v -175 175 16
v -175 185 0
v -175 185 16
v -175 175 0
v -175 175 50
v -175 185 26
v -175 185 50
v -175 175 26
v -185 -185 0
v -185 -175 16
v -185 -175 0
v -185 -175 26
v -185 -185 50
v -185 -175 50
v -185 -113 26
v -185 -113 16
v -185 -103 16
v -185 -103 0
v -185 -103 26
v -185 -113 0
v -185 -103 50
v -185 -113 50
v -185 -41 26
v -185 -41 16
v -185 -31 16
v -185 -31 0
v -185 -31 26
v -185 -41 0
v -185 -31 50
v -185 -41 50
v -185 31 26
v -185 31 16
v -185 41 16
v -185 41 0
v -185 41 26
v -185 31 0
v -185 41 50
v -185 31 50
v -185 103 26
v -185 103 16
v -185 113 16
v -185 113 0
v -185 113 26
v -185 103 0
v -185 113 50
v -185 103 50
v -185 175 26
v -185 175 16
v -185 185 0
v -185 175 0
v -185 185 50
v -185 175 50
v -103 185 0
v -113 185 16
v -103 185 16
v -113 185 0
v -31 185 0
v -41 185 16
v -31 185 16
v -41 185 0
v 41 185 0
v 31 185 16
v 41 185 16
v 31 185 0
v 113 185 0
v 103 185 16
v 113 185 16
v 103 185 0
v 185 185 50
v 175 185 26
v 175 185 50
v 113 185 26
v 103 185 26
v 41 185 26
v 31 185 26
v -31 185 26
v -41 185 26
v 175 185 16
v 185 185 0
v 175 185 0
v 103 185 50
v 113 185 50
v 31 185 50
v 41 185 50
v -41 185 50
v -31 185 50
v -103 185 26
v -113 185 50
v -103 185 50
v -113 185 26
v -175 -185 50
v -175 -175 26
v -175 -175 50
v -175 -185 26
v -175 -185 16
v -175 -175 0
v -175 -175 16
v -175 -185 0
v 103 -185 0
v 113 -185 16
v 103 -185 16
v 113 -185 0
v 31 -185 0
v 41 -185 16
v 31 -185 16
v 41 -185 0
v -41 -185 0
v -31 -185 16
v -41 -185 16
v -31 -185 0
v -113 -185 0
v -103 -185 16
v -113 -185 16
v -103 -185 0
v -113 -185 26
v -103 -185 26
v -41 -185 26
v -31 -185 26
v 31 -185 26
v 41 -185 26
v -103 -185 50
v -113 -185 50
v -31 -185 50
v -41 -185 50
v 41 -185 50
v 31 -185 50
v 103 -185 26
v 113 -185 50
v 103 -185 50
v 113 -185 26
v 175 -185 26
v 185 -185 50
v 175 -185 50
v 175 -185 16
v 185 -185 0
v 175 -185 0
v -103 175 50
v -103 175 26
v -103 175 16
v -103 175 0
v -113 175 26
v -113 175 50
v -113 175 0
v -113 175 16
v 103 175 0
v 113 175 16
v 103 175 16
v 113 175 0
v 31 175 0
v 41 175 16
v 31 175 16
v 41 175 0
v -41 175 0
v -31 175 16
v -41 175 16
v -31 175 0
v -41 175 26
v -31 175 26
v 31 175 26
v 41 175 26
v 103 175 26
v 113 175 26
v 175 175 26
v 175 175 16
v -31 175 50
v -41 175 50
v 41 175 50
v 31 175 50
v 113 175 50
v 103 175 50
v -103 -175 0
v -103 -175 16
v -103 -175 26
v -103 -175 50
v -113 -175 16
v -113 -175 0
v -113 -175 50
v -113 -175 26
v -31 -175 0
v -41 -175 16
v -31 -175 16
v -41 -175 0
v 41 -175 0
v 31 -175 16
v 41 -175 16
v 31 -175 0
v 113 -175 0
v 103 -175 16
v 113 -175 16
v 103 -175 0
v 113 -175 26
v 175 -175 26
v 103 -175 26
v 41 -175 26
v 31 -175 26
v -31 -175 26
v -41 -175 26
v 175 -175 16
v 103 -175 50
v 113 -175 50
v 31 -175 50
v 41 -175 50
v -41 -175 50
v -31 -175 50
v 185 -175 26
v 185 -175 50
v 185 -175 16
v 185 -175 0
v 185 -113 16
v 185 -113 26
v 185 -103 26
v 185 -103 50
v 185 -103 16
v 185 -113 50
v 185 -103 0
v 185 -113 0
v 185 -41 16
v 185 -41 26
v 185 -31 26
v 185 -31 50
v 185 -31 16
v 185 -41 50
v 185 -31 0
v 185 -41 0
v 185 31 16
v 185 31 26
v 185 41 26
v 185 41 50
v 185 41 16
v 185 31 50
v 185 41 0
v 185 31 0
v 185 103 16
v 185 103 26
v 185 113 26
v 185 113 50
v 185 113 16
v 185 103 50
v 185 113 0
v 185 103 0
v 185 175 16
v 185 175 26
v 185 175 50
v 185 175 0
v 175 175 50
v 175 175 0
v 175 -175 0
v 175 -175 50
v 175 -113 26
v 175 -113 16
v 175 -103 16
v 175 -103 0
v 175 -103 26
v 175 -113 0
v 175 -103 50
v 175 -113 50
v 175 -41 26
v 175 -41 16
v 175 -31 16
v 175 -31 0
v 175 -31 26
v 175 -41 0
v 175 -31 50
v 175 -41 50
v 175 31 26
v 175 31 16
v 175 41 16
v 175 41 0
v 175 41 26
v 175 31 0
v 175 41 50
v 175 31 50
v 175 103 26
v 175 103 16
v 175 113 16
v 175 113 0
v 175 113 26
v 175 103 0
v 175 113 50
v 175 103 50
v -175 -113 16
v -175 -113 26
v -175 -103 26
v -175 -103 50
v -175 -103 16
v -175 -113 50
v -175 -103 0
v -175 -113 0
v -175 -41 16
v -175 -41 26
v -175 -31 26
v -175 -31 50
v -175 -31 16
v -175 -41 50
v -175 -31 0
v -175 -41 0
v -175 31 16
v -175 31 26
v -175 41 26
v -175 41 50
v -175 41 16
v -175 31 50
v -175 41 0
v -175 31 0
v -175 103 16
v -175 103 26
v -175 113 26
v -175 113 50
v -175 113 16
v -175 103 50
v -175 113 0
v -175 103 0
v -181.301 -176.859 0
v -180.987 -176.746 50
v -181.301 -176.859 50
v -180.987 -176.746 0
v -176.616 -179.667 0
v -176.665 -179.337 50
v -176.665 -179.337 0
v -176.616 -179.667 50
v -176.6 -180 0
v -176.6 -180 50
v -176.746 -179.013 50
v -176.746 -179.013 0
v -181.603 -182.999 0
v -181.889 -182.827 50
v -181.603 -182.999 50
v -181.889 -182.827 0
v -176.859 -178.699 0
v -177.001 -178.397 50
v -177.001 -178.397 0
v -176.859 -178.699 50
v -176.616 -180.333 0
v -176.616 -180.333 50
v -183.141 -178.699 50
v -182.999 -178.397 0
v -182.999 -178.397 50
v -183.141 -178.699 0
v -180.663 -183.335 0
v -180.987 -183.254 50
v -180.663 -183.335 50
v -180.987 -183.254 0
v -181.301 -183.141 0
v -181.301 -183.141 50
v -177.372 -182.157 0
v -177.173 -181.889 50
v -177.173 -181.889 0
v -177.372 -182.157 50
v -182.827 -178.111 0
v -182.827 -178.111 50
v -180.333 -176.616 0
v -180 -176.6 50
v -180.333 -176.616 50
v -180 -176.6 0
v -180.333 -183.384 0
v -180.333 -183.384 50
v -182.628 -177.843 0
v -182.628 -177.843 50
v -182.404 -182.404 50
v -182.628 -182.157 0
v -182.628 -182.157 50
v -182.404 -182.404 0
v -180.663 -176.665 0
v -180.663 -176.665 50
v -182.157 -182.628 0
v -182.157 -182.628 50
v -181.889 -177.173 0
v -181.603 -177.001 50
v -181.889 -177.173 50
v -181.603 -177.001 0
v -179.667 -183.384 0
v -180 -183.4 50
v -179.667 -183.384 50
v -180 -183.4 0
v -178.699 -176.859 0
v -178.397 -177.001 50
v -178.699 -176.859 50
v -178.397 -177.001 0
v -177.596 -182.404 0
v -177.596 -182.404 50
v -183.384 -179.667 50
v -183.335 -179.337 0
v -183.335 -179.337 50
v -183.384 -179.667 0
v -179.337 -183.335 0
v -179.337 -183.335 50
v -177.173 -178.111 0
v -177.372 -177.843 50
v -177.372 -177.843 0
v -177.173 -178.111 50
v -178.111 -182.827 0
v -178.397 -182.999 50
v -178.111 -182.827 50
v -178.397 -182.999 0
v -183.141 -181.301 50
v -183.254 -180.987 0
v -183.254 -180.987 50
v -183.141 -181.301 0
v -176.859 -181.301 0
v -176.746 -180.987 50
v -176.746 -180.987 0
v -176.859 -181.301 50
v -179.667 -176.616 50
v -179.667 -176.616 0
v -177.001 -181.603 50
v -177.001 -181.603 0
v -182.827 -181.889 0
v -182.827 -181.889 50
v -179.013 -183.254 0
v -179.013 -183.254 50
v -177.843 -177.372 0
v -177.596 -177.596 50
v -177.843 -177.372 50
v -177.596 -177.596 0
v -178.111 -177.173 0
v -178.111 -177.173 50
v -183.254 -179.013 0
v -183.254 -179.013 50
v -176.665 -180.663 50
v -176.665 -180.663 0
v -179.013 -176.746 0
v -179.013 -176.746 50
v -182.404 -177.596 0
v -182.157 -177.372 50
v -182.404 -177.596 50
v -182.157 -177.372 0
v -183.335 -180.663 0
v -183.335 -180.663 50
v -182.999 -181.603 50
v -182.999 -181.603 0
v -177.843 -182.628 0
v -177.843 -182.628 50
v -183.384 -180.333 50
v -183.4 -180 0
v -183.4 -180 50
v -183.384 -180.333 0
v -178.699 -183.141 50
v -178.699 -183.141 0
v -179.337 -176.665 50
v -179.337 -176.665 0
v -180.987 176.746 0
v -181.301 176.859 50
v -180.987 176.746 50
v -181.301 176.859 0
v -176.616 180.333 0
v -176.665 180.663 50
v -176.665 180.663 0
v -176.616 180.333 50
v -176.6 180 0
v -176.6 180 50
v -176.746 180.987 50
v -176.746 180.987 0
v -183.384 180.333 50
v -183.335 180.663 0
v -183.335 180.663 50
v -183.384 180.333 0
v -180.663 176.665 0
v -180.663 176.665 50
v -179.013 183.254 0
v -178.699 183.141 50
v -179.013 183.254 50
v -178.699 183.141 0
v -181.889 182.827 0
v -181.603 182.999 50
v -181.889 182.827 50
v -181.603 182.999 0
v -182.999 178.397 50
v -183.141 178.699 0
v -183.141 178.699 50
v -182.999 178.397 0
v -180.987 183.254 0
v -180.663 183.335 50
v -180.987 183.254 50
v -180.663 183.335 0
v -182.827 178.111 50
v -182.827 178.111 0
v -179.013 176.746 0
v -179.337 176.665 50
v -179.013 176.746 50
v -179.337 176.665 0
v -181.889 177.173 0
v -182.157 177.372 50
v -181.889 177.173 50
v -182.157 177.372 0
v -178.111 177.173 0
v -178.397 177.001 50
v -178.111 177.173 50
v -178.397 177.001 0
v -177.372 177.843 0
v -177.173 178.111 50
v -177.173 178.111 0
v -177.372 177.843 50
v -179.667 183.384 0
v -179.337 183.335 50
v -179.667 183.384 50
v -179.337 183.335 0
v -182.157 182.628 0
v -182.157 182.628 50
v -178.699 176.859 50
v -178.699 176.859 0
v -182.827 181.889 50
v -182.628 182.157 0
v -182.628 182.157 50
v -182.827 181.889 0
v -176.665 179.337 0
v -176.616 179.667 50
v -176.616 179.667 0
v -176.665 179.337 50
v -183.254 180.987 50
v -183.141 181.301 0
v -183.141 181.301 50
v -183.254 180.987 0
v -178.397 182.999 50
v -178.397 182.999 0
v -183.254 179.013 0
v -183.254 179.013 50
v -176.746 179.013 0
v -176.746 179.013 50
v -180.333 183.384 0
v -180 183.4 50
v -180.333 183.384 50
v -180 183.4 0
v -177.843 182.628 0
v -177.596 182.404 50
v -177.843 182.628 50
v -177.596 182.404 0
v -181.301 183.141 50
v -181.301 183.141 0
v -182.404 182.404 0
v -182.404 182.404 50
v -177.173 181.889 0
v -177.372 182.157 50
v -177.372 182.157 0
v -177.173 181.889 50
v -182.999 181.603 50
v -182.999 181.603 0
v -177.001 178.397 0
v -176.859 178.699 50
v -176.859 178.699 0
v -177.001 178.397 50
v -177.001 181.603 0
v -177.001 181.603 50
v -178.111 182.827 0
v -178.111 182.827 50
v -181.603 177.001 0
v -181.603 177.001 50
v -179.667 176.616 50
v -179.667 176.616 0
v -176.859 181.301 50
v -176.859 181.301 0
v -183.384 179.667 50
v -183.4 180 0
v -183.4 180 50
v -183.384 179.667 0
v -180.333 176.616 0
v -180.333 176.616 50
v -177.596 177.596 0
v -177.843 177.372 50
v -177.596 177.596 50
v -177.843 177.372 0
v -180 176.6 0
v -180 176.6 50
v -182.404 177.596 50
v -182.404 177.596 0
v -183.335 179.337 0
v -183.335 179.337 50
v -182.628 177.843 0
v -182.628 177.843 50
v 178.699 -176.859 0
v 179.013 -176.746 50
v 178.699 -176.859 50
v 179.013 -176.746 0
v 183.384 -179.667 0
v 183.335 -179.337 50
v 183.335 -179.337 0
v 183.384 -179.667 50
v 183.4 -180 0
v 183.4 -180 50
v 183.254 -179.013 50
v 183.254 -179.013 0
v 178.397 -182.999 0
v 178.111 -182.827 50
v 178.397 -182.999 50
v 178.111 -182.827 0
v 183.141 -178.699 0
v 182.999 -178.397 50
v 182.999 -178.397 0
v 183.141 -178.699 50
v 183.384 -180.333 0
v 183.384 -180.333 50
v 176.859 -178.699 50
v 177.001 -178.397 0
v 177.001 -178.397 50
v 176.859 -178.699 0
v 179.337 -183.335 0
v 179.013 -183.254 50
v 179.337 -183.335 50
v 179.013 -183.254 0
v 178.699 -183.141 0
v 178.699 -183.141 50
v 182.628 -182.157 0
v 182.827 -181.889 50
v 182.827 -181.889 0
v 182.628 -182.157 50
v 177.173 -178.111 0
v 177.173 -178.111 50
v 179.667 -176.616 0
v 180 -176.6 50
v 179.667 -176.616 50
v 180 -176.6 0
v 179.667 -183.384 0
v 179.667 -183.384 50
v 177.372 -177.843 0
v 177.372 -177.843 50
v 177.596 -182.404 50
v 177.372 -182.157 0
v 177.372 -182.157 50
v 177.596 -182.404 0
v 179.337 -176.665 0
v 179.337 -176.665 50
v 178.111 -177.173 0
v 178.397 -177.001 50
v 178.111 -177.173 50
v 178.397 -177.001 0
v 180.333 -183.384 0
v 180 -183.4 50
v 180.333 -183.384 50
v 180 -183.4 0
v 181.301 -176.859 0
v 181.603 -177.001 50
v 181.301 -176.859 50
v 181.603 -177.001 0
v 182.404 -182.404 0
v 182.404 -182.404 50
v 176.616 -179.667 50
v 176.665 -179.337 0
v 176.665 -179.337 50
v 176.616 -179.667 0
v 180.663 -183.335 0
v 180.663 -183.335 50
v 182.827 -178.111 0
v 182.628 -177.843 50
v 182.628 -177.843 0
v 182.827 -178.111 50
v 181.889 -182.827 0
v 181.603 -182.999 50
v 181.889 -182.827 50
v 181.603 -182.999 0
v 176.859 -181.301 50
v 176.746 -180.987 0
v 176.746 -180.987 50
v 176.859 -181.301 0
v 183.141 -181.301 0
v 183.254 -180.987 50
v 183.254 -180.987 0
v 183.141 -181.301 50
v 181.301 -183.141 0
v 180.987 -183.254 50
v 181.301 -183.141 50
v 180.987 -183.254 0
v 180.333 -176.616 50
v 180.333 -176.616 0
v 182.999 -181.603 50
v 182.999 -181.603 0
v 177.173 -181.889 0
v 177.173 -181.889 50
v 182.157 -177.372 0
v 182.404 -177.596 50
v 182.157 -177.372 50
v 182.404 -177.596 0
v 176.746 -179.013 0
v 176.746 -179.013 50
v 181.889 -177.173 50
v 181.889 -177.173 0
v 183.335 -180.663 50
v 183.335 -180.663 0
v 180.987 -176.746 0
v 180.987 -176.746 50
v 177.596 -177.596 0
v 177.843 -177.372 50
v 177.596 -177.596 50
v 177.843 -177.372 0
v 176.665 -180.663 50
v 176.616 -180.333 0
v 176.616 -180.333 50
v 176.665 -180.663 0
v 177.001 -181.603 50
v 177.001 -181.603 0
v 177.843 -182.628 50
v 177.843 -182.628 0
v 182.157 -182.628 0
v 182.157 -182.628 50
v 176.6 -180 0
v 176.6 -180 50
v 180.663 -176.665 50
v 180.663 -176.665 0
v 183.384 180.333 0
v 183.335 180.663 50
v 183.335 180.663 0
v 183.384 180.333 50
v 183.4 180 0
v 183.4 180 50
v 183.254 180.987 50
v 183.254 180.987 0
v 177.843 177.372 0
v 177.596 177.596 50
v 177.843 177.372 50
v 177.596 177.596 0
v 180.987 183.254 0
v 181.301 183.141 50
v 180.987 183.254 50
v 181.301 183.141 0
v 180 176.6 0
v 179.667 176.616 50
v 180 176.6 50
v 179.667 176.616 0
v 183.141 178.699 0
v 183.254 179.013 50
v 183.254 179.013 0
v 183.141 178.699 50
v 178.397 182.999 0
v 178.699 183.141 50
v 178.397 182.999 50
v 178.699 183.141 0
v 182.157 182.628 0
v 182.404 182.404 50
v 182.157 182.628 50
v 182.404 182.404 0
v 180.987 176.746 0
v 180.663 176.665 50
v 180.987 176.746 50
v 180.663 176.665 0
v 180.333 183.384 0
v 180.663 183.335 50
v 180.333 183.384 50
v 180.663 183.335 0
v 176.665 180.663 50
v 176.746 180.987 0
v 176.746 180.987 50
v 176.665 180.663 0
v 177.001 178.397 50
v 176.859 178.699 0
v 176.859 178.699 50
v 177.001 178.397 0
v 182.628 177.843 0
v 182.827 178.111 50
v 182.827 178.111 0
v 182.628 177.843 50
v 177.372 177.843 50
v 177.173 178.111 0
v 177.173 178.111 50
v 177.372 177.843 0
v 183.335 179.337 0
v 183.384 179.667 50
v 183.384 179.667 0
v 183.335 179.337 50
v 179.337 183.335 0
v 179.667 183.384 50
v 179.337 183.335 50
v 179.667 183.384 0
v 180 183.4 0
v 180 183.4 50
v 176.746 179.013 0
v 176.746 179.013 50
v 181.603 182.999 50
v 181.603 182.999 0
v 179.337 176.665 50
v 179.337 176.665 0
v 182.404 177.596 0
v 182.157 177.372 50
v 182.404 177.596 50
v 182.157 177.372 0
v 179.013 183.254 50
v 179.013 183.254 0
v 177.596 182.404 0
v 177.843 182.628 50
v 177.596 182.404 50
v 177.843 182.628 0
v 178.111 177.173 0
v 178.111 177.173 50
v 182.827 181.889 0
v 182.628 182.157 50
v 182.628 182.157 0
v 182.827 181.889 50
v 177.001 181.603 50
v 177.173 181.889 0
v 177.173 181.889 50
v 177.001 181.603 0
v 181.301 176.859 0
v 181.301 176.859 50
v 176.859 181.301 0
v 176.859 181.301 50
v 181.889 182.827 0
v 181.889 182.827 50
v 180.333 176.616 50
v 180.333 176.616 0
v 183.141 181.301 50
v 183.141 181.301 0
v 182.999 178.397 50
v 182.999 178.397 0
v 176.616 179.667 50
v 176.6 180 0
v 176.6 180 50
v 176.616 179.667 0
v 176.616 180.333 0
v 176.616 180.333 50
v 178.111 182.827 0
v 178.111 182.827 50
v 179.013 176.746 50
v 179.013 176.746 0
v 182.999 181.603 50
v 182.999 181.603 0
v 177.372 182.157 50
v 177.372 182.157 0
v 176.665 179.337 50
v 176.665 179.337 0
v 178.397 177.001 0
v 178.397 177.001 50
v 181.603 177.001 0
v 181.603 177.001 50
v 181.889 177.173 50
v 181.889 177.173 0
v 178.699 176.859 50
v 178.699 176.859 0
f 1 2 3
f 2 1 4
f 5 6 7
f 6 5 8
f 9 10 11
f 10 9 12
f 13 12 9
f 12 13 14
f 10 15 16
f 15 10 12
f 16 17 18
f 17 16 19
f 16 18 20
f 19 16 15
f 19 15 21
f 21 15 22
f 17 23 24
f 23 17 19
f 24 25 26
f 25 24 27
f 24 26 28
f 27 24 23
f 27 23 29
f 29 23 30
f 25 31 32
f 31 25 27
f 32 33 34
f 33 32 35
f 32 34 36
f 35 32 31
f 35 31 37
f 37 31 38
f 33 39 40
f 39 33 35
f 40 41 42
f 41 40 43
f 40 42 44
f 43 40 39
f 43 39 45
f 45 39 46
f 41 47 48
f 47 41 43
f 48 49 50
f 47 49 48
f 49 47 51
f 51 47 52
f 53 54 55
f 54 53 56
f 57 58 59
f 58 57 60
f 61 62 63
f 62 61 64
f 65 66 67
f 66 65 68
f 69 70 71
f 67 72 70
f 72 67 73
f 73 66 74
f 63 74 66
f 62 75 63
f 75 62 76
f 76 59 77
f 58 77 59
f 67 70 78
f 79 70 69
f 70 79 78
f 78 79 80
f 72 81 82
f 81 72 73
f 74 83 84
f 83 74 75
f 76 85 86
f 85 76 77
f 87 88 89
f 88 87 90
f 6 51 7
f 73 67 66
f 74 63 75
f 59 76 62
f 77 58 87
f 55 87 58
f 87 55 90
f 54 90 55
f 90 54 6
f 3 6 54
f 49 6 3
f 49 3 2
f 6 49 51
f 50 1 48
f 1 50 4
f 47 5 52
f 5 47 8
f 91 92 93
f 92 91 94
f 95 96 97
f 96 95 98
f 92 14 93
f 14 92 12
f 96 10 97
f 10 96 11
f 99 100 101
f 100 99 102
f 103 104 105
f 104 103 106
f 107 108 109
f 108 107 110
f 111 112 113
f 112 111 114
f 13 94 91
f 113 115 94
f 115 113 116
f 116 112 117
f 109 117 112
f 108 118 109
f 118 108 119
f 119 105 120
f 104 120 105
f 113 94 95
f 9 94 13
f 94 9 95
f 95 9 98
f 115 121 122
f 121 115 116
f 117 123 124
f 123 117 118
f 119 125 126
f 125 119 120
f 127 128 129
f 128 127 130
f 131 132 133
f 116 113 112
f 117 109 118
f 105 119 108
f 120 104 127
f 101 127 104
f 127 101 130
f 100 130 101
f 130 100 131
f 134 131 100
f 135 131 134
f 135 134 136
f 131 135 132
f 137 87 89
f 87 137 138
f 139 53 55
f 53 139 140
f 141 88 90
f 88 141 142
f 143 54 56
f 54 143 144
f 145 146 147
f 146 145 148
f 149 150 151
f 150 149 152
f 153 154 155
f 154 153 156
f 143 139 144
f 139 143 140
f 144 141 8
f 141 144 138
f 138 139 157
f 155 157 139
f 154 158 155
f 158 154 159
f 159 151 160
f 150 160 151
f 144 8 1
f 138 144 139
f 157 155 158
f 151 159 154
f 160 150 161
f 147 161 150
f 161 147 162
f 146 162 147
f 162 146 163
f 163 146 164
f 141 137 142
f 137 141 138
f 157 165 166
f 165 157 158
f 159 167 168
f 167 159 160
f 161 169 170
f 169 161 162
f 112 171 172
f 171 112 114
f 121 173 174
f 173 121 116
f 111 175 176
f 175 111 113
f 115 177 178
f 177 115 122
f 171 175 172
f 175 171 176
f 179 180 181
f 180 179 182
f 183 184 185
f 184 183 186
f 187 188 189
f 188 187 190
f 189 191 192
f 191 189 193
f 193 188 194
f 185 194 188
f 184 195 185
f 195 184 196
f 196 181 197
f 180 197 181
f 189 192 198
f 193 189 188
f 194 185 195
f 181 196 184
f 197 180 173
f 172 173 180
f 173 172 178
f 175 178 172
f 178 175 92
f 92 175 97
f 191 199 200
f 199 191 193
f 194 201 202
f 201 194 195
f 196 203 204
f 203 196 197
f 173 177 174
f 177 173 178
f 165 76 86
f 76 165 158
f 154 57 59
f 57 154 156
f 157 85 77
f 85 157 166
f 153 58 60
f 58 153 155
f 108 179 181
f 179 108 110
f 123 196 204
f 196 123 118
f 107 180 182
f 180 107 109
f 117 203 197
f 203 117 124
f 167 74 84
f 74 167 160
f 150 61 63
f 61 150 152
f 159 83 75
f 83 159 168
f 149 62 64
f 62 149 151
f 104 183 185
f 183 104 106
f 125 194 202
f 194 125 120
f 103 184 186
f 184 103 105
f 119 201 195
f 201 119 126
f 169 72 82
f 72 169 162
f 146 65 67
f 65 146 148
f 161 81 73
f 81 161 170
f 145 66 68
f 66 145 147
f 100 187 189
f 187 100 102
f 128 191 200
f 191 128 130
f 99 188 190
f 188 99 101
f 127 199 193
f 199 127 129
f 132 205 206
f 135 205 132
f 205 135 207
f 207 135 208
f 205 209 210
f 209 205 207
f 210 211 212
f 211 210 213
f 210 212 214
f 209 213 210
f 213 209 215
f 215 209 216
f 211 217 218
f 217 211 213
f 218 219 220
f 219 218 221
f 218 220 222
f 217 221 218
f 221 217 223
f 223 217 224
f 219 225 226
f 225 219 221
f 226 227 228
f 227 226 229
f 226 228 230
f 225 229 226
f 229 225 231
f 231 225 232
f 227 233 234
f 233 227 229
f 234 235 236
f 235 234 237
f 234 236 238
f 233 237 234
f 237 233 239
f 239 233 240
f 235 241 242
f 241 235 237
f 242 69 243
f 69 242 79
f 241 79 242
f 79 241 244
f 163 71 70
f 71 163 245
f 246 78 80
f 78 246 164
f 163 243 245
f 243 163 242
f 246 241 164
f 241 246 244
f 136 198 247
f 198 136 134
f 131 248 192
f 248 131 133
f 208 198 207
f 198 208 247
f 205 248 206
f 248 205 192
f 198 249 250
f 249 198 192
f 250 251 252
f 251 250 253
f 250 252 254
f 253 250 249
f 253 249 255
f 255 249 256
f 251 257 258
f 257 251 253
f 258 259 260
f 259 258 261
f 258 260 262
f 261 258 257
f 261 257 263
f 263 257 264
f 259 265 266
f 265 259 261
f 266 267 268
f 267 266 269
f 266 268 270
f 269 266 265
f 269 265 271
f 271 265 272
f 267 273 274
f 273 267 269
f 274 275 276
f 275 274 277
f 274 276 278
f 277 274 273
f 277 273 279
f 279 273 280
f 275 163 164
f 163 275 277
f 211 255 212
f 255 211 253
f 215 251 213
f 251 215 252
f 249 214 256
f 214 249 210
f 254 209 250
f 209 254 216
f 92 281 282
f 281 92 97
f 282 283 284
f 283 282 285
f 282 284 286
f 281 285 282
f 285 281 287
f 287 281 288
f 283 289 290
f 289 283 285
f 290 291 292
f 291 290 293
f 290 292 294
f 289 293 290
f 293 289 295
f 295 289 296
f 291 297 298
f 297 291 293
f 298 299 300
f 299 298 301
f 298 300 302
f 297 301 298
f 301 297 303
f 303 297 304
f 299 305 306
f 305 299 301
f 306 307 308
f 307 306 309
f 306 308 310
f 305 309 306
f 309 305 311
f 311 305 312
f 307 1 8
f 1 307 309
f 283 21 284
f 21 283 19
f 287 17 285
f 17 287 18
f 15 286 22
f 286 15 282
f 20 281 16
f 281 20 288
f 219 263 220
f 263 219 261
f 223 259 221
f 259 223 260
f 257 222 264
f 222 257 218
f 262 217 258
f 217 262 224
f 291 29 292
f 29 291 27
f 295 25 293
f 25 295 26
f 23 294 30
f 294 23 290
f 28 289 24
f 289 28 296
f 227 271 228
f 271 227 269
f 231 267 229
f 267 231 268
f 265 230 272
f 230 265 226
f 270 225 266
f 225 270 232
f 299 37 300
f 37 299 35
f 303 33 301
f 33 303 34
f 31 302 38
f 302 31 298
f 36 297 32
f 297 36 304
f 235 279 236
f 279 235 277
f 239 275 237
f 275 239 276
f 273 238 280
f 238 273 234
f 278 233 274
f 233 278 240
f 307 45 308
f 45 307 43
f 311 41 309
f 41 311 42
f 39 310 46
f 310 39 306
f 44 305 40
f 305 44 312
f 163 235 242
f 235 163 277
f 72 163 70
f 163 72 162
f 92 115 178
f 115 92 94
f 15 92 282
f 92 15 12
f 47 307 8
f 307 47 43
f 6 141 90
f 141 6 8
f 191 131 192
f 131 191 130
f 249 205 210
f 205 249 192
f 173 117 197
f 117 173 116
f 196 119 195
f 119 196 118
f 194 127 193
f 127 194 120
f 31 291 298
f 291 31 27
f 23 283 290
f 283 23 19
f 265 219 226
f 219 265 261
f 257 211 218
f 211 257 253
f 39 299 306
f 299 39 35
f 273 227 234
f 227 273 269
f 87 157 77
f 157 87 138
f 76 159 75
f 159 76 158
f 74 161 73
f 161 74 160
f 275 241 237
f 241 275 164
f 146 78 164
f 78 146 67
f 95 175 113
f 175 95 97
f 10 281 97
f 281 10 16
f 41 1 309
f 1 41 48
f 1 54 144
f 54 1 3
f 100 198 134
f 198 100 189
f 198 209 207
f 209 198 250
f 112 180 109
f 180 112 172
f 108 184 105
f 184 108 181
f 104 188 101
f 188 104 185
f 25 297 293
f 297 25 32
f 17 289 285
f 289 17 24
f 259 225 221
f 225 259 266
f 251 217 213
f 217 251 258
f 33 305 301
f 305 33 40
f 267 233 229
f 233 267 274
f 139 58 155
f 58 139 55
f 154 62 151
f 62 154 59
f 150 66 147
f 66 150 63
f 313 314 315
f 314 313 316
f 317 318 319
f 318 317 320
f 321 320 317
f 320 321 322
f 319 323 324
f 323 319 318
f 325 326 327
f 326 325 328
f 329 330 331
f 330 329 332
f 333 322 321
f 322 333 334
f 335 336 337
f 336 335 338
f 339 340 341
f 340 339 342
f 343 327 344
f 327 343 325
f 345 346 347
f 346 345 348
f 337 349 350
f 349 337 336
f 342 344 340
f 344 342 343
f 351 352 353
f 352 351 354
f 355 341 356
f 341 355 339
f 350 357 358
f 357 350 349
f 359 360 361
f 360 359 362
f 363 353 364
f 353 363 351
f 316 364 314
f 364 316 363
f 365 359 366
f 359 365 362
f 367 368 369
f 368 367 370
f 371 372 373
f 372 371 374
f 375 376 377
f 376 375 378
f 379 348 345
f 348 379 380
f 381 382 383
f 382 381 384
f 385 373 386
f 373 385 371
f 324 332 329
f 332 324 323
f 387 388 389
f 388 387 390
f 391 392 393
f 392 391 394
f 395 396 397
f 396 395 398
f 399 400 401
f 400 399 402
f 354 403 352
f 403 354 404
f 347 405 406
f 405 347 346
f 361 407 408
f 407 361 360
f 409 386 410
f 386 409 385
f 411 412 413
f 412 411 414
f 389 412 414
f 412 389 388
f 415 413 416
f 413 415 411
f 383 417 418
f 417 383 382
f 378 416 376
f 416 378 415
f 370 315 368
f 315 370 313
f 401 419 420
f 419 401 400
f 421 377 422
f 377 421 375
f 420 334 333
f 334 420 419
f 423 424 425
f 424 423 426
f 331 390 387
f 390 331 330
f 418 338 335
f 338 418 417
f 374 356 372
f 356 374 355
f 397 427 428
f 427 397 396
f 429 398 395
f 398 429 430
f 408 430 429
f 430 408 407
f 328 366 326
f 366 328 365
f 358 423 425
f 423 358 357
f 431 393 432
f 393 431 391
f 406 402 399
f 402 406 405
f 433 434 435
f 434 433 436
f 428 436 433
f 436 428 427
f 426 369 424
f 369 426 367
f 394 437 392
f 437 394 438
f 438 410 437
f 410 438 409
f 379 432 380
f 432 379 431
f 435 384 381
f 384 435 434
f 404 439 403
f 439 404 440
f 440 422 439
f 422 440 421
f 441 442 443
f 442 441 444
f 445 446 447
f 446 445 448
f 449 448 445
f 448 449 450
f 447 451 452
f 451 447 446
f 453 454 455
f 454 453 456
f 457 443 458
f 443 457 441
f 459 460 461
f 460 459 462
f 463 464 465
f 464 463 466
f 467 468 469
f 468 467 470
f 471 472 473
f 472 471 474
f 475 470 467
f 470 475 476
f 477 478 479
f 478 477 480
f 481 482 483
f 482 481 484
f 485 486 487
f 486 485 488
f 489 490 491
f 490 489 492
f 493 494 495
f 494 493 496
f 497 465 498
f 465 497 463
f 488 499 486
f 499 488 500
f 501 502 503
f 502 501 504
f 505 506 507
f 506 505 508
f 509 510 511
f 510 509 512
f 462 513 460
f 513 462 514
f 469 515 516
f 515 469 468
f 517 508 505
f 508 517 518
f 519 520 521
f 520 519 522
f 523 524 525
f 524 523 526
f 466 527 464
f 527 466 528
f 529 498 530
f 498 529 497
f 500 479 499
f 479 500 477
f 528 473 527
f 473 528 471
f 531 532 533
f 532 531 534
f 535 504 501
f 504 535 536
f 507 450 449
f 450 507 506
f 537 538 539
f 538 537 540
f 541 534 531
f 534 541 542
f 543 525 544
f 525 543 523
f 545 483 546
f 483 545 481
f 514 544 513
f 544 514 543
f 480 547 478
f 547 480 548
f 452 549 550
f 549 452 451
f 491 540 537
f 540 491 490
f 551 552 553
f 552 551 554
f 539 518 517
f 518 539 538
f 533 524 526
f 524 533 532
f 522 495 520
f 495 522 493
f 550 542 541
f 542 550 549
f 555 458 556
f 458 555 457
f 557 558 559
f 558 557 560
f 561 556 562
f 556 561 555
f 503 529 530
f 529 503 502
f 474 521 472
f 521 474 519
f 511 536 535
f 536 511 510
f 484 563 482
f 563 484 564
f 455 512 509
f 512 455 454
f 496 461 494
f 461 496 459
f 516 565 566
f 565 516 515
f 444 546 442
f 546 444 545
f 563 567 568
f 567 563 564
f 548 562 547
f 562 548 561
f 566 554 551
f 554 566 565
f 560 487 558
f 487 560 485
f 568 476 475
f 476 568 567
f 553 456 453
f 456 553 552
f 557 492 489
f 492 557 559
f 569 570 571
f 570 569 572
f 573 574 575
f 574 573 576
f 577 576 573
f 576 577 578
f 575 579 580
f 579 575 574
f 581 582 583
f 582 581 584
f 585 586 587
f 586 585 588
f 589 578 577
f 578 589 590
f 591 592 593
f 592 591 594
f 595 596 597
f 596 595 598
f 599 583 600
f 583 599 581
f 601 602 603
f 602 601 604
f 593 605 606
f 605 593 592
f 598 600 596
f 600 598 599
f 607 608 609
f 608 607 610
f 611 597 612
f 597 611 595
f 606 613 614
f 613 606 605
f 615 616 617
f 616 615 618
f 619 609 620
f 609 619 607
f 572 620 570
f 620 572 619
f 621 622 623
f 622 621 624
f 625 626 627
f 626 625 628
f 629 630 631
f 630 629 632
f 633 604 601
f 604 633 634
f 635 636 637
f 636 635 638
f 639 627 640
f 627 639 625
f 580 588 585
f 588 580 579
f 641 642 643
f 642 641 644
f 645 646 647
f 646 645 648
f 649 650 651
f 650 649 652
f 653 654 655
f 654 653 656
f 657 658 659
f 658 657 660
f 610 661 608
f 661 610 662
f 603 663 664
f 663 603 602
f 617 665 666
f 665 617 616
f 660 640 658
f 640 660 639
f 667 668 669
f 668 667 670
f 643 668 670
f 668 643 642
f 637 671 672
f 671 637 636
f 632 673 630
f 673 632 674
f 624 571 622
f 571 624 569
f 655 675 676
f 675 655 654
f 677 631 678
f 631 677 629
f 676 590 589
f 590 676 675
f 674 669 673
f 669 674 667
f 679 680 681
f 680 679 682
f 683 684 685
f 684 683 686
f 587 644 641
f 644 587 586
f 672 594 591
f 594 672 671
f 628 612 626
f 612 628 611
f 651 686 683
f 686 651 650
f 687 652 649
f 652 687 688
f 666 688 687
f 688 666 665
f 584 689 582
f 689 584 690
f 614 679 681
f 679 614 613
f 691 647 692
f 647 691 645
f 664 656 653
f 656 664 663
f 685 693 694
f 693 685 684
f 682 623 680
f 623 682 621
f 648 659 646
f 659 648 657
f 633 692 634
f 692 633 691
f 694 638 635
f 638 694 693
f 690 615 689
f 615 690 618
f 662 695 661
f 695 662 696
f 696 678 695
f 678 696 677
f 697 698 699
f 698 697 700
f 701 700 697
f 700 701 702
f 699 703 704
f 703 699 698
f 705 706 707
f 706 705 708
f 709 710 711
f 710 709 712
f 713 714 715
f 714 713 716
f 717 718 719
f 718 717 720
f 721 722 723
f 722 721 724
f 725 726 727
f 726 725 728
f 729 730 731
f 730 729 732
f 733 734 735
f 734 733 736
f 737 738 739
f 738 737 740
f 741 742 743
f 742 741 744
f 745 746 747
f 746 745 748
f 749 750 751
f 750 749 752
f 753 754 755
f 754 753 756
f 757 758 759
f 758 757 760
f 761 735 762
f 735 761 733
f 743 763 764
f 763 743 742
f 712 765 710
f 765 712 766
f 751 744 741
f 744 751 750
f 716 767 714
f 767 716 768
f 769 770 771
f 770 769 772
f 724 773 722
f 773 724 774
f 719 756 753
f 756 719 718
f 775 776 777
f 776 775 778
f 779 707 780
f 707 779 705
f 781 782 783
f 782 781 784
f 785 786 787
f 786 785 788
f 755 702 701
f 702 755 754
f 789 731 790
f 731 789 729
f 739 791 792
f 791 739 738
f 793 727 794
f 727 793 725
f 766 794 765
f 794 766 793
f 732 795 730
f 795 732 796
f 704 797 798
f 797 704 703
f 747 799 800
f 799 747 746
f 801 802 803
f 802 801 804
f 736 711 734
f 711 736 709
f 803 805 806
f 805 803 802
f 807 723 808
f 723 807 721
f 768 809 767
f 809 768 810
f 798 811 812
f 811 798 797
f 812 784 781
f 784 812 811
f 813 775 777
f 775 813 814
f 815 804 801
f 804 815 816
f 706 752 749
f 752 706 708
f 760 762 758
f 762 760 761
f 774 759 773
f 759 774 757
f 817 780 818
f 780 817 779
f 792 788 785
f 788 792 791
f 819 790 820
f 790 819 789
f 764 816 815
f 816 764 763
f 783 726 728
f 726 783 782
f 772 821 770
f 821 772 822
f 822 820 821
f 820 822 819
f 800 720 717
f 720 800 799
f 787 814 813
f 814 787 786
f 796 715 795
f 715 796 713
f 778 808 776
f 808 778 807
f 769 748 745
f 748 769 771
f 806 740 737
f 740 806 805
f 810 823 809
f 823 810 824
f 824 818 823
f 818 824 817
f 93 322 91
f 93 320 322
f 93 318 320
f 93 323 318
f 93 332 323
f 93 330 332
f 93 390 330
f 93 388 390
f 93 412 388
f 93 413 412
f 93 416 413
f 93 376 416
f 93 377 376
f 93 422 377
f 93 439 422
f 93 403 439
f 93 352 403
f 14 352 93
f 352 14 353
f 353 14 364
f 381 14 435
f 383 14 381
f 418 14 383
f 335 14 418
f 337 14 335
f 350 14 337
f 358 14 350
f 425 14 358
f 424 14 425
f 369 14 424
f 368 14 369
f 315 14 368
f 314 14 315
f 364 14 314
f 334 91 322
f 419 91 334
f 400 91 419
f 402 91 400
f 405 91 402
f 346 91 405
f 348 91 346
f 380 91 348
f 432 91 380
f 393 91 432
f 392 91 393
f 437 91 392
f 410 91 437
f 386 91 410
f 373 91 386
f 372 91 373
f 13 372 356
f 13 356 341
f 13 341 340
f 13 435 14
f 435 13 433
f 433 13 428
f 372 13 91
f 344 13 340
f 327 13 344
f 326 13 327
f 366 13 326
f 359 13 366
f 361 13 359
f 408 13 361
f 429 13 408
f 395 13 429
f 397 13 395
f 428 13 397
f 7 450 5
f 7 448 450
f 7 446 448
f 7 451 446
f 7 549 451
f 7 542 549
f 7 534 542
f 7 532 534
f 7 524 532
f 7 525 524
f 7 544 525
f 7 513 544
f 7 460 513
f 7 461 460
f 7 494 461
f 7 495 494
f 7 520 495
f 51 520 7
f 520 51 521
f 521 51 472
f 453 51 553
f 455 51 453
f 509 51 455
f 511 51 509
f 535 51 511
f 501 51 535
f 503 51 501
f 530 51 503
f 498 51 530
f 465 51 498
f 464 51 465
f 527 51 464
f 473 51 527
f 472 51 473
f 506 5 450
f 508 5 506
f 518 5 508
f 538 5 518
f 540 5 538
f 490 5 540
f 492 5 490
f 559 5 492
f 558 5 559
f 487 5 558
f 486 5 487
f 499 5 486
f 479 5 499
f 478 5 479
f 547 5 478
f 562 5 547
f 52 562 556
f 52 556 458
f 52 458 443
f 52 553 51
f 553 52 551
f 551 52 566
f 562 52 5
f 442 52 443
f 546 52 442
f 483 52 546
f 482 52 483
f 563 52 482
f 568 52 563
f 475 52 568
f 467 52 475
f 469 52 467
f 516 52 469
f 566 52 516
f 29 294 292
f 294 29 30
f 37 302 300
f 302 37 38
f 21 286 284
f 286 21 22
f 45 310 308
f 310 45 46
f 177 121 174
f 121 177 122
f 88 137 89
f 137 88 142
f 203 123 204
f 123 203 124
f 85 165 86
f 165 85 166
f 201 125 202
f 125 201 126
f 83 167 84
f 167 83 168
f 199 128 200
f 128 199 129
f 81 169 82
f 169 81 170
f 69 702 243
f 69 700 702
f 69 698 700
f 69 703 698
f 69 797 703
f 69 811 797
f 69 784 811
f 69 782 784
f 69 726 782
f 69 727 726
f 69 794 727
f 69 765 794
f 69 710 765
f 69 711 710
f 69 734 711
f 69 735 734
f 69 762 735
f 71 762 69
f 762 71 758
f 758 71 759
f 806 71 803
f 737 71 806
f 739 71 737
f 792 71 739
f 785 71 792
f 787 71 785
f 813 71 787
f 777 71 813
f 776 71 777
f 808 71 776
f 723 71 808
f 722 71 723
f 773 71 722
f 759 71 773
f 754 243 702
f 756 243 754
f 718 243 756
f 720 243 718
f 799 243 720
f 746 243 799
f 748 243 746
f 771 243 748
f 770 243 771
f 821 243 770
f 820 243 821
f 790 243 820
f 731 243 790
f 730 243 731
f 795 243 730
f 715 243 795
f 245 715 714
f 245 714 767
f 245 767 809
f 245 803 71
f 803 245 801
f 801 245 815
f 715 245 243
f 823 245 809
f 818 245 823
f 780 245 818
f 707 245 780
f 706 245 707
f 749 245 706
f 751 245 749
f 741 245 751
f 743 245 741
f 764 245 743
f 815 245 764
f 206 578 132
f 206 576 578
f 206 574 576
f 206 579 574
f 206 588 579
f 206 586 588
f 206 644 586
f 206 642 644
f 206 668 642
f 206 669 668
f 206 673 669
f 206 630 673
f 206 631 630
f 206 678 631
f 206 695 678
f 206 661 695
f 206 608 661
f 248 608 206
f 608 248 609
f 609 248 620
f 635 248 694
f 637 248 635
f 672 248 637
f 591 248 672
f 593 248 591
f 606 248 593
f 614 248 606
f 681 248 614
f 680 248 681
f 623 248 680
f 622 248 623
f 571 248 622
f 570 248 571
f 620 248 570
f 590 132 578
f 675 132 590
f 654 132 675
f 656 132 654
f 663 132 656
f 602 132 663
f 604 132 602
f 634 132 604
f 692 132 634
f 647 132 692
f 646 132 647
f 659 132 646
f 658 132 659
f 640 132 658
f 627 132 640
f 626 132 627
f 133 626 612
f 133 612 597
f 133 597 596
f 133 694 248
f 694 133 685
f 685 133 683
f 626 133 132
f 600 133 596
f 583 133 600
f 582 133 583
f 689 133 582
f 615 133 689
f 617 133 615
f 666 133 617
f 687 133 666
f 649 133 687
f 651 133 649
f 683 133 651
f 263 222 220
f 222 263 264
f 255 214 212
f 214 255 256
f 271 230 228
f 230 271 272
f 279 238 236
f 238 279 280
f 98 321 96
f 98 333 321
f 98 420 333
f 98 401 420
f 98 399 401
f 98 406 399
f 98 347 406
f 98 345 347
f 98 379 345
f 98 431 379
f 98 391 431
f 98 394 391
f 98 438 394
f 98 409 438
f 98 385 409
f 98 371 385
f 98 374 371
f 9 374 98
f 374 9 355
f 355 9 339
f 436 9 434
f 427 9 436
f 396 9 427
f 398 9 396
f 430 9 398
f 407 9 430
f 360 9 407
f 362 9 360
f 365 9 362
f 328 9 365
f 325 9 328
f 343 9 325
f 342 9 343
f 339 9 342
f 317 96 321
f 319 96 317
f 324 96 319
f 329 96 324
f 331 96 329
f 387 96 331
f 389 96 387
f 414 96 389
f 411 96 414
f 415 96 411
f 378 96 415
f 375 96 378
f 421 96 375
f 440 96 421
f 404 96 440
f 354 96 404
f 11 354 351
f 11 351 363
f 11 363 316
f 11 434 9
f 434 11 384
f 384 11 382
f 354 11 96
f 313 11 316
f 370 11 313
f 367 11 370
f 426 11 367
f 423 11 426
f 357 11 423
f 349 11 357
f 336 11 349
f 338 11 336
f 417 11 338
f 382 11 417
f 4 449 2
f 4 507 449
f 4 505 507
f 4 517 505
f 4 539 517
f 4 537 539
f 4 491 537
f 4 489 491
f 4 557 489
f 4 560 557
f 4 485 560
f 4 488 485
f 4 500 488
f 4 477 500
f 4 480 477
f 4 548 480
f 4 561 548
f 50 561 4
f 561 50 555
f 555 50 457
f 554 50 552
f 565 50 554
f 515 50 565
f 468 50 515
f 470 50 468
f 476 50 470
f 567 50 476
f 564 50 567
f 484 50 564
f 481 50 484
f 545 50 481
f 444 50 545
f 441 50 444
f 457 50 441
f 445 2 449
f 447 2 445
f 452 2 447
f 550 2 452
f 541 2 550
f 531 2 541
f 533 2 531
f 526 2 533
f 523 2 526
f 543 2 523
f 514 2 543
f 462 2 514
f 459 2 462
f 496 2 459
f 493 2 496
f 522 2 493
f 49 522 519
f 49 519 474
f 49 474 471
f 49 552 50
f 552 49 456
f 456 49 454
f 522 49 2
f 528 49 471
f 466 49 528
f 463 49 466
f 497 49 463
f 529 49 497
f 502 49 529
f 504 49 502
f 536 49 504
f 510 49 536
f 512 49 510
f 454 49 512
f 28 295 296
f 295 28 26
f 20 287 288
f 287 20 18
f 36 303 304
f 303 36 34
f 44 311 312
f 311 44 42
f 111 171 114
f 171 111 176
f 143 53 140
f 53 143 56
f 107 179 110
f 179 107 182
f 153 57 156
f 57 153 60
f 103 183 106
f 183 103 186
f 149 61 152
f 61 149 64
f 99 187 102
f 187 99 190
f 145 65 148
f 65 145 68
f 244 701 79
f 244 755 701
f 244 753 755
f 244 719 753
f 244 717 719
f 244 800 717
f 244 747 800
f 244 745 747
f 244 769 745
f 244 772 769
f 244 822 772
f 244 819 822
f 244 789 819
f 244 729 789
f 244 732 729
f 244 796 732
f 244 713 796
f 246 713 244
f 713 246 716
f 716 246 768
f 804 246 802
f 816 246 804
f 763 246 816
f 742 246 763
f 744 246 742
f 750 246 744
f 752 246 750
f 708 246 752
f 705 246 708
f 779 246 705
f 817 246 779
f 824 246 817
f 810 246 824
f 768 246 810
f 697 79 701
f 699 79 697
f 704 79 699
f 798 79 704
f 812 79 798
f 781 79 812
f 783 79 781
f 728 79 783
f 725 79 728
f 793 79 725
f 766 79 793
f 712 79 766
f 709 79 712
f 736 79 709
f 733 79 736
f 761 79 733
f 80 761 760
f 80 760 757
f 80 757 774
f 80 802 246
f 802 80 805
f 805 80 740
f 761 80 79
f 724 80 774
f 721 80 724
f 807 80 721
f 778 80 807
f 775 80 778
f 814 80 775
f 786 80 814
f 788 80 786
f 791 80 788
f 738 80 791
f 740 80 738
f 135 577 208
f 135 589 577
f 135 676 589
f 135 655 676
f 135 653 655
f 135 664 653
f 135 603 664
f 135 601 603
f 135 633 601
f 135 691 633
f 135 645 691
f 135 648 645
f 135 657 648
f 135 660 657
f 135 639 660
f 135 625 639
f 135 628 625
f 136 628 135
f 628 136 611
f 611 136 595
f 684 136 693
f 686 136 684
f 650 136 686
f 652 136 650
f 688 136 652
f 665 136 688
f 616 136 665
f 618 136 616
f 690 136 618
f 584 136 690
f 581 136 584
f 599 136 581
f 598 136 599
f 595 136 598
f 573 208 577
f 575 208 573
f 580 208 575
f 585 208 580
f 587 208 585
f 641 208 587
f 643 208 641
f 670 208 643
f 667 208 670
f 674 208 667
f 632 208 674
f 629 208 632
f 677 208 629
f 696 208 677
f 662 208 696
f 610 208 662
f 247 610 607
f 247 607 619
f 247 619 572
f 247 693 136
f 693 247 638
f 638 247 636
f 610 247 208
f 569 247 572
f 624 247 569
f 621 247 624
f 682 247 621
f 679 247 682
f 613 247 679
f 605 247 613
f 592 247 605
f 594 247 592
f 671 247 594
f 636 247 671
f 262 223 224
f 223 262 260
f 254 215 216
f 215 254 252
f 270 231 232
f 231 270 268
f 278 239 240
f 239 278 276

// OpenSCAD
// Cage slice part (z0..z1). Units: mm.
// Print orientation: normal

bar=10;
inner=[350,350,700];
gap_xy=62;
gap_z=61;
hole_d=6.8;
$fn=64;

outer=[inner[0]+2*bar, inner[1]+2*bar, inner[2]+2*bar];
half=[outer[0]/2, outer[1]/2, outer[2]/2];

pitch_xy=bar+gap_xy;
pitch_z=bar+gap_z;

centers=[for(i=[0:5]) -(half[0]-bar/2) + i*pitch_xy];
z_levels=[for(i=[0:10]) i*pitch_z];

module vbar(xc,yc){ translate([xc-bar/2,yc-bar/2,0]) cube([bar,bar,outer[2]],center=false); }
module hbar_x(yc,z0){ translate([-half[0],yc-bar/2,z0]) cube([outer[0],bar,bar],center=false); }
module hbar_y(xc,z0){ translate([xc-bar/2,-half[1],z0]) cube([bar,outer[1],bar],center=false); }

module grid(z0){ union(){ for(yc=centers) hbar_x(yc,z0); for(xc=centers) hbar_y(xc,z0); } }

module side_verticals(){
  union(){
    for(xc=centers){ vbar(xc, half[1]-bar/2); vbar(xc,-half[1]+bar/2); }
    for(yc=centers){ vbar( half[0]-bar/2,yc); vbar(-half[0]+bar/2,yc); }
  }
}

module side_rings(){
  union(){
    for(z0=z_levels){
      hbar_x( half[1]-bar/2,z0); hbar_x(-half[1]+bar/2,z0);
      hbar_y( half[0]-bar/2,z0); hbar_y(-half[0]+bar/2,z0);
    }
  }
}

module rod_holes(){
  for(sx=[-1,1],sy=[-1,1]) translate([sx*(half[0]-bar/2), sy*(half[1]-bar/2), -1]) cylinder(d=hole_d,h=outer[2]+2,center=false);
}

module cage(){ difference(){ union(){ side_verticals(); side_rings(); grid(0); grid(outer[2]-bar); } rod_holes(); } }

module cage_slice(zmin,zmax){ intersection(){ cage(); translate([-1000,-1000,zmin]) cube([2000,2000,zmax-zmin],center=false); } }

z0=197; z1=247;
translate([0,0,-z0]) cage_slice(z0,z1);
